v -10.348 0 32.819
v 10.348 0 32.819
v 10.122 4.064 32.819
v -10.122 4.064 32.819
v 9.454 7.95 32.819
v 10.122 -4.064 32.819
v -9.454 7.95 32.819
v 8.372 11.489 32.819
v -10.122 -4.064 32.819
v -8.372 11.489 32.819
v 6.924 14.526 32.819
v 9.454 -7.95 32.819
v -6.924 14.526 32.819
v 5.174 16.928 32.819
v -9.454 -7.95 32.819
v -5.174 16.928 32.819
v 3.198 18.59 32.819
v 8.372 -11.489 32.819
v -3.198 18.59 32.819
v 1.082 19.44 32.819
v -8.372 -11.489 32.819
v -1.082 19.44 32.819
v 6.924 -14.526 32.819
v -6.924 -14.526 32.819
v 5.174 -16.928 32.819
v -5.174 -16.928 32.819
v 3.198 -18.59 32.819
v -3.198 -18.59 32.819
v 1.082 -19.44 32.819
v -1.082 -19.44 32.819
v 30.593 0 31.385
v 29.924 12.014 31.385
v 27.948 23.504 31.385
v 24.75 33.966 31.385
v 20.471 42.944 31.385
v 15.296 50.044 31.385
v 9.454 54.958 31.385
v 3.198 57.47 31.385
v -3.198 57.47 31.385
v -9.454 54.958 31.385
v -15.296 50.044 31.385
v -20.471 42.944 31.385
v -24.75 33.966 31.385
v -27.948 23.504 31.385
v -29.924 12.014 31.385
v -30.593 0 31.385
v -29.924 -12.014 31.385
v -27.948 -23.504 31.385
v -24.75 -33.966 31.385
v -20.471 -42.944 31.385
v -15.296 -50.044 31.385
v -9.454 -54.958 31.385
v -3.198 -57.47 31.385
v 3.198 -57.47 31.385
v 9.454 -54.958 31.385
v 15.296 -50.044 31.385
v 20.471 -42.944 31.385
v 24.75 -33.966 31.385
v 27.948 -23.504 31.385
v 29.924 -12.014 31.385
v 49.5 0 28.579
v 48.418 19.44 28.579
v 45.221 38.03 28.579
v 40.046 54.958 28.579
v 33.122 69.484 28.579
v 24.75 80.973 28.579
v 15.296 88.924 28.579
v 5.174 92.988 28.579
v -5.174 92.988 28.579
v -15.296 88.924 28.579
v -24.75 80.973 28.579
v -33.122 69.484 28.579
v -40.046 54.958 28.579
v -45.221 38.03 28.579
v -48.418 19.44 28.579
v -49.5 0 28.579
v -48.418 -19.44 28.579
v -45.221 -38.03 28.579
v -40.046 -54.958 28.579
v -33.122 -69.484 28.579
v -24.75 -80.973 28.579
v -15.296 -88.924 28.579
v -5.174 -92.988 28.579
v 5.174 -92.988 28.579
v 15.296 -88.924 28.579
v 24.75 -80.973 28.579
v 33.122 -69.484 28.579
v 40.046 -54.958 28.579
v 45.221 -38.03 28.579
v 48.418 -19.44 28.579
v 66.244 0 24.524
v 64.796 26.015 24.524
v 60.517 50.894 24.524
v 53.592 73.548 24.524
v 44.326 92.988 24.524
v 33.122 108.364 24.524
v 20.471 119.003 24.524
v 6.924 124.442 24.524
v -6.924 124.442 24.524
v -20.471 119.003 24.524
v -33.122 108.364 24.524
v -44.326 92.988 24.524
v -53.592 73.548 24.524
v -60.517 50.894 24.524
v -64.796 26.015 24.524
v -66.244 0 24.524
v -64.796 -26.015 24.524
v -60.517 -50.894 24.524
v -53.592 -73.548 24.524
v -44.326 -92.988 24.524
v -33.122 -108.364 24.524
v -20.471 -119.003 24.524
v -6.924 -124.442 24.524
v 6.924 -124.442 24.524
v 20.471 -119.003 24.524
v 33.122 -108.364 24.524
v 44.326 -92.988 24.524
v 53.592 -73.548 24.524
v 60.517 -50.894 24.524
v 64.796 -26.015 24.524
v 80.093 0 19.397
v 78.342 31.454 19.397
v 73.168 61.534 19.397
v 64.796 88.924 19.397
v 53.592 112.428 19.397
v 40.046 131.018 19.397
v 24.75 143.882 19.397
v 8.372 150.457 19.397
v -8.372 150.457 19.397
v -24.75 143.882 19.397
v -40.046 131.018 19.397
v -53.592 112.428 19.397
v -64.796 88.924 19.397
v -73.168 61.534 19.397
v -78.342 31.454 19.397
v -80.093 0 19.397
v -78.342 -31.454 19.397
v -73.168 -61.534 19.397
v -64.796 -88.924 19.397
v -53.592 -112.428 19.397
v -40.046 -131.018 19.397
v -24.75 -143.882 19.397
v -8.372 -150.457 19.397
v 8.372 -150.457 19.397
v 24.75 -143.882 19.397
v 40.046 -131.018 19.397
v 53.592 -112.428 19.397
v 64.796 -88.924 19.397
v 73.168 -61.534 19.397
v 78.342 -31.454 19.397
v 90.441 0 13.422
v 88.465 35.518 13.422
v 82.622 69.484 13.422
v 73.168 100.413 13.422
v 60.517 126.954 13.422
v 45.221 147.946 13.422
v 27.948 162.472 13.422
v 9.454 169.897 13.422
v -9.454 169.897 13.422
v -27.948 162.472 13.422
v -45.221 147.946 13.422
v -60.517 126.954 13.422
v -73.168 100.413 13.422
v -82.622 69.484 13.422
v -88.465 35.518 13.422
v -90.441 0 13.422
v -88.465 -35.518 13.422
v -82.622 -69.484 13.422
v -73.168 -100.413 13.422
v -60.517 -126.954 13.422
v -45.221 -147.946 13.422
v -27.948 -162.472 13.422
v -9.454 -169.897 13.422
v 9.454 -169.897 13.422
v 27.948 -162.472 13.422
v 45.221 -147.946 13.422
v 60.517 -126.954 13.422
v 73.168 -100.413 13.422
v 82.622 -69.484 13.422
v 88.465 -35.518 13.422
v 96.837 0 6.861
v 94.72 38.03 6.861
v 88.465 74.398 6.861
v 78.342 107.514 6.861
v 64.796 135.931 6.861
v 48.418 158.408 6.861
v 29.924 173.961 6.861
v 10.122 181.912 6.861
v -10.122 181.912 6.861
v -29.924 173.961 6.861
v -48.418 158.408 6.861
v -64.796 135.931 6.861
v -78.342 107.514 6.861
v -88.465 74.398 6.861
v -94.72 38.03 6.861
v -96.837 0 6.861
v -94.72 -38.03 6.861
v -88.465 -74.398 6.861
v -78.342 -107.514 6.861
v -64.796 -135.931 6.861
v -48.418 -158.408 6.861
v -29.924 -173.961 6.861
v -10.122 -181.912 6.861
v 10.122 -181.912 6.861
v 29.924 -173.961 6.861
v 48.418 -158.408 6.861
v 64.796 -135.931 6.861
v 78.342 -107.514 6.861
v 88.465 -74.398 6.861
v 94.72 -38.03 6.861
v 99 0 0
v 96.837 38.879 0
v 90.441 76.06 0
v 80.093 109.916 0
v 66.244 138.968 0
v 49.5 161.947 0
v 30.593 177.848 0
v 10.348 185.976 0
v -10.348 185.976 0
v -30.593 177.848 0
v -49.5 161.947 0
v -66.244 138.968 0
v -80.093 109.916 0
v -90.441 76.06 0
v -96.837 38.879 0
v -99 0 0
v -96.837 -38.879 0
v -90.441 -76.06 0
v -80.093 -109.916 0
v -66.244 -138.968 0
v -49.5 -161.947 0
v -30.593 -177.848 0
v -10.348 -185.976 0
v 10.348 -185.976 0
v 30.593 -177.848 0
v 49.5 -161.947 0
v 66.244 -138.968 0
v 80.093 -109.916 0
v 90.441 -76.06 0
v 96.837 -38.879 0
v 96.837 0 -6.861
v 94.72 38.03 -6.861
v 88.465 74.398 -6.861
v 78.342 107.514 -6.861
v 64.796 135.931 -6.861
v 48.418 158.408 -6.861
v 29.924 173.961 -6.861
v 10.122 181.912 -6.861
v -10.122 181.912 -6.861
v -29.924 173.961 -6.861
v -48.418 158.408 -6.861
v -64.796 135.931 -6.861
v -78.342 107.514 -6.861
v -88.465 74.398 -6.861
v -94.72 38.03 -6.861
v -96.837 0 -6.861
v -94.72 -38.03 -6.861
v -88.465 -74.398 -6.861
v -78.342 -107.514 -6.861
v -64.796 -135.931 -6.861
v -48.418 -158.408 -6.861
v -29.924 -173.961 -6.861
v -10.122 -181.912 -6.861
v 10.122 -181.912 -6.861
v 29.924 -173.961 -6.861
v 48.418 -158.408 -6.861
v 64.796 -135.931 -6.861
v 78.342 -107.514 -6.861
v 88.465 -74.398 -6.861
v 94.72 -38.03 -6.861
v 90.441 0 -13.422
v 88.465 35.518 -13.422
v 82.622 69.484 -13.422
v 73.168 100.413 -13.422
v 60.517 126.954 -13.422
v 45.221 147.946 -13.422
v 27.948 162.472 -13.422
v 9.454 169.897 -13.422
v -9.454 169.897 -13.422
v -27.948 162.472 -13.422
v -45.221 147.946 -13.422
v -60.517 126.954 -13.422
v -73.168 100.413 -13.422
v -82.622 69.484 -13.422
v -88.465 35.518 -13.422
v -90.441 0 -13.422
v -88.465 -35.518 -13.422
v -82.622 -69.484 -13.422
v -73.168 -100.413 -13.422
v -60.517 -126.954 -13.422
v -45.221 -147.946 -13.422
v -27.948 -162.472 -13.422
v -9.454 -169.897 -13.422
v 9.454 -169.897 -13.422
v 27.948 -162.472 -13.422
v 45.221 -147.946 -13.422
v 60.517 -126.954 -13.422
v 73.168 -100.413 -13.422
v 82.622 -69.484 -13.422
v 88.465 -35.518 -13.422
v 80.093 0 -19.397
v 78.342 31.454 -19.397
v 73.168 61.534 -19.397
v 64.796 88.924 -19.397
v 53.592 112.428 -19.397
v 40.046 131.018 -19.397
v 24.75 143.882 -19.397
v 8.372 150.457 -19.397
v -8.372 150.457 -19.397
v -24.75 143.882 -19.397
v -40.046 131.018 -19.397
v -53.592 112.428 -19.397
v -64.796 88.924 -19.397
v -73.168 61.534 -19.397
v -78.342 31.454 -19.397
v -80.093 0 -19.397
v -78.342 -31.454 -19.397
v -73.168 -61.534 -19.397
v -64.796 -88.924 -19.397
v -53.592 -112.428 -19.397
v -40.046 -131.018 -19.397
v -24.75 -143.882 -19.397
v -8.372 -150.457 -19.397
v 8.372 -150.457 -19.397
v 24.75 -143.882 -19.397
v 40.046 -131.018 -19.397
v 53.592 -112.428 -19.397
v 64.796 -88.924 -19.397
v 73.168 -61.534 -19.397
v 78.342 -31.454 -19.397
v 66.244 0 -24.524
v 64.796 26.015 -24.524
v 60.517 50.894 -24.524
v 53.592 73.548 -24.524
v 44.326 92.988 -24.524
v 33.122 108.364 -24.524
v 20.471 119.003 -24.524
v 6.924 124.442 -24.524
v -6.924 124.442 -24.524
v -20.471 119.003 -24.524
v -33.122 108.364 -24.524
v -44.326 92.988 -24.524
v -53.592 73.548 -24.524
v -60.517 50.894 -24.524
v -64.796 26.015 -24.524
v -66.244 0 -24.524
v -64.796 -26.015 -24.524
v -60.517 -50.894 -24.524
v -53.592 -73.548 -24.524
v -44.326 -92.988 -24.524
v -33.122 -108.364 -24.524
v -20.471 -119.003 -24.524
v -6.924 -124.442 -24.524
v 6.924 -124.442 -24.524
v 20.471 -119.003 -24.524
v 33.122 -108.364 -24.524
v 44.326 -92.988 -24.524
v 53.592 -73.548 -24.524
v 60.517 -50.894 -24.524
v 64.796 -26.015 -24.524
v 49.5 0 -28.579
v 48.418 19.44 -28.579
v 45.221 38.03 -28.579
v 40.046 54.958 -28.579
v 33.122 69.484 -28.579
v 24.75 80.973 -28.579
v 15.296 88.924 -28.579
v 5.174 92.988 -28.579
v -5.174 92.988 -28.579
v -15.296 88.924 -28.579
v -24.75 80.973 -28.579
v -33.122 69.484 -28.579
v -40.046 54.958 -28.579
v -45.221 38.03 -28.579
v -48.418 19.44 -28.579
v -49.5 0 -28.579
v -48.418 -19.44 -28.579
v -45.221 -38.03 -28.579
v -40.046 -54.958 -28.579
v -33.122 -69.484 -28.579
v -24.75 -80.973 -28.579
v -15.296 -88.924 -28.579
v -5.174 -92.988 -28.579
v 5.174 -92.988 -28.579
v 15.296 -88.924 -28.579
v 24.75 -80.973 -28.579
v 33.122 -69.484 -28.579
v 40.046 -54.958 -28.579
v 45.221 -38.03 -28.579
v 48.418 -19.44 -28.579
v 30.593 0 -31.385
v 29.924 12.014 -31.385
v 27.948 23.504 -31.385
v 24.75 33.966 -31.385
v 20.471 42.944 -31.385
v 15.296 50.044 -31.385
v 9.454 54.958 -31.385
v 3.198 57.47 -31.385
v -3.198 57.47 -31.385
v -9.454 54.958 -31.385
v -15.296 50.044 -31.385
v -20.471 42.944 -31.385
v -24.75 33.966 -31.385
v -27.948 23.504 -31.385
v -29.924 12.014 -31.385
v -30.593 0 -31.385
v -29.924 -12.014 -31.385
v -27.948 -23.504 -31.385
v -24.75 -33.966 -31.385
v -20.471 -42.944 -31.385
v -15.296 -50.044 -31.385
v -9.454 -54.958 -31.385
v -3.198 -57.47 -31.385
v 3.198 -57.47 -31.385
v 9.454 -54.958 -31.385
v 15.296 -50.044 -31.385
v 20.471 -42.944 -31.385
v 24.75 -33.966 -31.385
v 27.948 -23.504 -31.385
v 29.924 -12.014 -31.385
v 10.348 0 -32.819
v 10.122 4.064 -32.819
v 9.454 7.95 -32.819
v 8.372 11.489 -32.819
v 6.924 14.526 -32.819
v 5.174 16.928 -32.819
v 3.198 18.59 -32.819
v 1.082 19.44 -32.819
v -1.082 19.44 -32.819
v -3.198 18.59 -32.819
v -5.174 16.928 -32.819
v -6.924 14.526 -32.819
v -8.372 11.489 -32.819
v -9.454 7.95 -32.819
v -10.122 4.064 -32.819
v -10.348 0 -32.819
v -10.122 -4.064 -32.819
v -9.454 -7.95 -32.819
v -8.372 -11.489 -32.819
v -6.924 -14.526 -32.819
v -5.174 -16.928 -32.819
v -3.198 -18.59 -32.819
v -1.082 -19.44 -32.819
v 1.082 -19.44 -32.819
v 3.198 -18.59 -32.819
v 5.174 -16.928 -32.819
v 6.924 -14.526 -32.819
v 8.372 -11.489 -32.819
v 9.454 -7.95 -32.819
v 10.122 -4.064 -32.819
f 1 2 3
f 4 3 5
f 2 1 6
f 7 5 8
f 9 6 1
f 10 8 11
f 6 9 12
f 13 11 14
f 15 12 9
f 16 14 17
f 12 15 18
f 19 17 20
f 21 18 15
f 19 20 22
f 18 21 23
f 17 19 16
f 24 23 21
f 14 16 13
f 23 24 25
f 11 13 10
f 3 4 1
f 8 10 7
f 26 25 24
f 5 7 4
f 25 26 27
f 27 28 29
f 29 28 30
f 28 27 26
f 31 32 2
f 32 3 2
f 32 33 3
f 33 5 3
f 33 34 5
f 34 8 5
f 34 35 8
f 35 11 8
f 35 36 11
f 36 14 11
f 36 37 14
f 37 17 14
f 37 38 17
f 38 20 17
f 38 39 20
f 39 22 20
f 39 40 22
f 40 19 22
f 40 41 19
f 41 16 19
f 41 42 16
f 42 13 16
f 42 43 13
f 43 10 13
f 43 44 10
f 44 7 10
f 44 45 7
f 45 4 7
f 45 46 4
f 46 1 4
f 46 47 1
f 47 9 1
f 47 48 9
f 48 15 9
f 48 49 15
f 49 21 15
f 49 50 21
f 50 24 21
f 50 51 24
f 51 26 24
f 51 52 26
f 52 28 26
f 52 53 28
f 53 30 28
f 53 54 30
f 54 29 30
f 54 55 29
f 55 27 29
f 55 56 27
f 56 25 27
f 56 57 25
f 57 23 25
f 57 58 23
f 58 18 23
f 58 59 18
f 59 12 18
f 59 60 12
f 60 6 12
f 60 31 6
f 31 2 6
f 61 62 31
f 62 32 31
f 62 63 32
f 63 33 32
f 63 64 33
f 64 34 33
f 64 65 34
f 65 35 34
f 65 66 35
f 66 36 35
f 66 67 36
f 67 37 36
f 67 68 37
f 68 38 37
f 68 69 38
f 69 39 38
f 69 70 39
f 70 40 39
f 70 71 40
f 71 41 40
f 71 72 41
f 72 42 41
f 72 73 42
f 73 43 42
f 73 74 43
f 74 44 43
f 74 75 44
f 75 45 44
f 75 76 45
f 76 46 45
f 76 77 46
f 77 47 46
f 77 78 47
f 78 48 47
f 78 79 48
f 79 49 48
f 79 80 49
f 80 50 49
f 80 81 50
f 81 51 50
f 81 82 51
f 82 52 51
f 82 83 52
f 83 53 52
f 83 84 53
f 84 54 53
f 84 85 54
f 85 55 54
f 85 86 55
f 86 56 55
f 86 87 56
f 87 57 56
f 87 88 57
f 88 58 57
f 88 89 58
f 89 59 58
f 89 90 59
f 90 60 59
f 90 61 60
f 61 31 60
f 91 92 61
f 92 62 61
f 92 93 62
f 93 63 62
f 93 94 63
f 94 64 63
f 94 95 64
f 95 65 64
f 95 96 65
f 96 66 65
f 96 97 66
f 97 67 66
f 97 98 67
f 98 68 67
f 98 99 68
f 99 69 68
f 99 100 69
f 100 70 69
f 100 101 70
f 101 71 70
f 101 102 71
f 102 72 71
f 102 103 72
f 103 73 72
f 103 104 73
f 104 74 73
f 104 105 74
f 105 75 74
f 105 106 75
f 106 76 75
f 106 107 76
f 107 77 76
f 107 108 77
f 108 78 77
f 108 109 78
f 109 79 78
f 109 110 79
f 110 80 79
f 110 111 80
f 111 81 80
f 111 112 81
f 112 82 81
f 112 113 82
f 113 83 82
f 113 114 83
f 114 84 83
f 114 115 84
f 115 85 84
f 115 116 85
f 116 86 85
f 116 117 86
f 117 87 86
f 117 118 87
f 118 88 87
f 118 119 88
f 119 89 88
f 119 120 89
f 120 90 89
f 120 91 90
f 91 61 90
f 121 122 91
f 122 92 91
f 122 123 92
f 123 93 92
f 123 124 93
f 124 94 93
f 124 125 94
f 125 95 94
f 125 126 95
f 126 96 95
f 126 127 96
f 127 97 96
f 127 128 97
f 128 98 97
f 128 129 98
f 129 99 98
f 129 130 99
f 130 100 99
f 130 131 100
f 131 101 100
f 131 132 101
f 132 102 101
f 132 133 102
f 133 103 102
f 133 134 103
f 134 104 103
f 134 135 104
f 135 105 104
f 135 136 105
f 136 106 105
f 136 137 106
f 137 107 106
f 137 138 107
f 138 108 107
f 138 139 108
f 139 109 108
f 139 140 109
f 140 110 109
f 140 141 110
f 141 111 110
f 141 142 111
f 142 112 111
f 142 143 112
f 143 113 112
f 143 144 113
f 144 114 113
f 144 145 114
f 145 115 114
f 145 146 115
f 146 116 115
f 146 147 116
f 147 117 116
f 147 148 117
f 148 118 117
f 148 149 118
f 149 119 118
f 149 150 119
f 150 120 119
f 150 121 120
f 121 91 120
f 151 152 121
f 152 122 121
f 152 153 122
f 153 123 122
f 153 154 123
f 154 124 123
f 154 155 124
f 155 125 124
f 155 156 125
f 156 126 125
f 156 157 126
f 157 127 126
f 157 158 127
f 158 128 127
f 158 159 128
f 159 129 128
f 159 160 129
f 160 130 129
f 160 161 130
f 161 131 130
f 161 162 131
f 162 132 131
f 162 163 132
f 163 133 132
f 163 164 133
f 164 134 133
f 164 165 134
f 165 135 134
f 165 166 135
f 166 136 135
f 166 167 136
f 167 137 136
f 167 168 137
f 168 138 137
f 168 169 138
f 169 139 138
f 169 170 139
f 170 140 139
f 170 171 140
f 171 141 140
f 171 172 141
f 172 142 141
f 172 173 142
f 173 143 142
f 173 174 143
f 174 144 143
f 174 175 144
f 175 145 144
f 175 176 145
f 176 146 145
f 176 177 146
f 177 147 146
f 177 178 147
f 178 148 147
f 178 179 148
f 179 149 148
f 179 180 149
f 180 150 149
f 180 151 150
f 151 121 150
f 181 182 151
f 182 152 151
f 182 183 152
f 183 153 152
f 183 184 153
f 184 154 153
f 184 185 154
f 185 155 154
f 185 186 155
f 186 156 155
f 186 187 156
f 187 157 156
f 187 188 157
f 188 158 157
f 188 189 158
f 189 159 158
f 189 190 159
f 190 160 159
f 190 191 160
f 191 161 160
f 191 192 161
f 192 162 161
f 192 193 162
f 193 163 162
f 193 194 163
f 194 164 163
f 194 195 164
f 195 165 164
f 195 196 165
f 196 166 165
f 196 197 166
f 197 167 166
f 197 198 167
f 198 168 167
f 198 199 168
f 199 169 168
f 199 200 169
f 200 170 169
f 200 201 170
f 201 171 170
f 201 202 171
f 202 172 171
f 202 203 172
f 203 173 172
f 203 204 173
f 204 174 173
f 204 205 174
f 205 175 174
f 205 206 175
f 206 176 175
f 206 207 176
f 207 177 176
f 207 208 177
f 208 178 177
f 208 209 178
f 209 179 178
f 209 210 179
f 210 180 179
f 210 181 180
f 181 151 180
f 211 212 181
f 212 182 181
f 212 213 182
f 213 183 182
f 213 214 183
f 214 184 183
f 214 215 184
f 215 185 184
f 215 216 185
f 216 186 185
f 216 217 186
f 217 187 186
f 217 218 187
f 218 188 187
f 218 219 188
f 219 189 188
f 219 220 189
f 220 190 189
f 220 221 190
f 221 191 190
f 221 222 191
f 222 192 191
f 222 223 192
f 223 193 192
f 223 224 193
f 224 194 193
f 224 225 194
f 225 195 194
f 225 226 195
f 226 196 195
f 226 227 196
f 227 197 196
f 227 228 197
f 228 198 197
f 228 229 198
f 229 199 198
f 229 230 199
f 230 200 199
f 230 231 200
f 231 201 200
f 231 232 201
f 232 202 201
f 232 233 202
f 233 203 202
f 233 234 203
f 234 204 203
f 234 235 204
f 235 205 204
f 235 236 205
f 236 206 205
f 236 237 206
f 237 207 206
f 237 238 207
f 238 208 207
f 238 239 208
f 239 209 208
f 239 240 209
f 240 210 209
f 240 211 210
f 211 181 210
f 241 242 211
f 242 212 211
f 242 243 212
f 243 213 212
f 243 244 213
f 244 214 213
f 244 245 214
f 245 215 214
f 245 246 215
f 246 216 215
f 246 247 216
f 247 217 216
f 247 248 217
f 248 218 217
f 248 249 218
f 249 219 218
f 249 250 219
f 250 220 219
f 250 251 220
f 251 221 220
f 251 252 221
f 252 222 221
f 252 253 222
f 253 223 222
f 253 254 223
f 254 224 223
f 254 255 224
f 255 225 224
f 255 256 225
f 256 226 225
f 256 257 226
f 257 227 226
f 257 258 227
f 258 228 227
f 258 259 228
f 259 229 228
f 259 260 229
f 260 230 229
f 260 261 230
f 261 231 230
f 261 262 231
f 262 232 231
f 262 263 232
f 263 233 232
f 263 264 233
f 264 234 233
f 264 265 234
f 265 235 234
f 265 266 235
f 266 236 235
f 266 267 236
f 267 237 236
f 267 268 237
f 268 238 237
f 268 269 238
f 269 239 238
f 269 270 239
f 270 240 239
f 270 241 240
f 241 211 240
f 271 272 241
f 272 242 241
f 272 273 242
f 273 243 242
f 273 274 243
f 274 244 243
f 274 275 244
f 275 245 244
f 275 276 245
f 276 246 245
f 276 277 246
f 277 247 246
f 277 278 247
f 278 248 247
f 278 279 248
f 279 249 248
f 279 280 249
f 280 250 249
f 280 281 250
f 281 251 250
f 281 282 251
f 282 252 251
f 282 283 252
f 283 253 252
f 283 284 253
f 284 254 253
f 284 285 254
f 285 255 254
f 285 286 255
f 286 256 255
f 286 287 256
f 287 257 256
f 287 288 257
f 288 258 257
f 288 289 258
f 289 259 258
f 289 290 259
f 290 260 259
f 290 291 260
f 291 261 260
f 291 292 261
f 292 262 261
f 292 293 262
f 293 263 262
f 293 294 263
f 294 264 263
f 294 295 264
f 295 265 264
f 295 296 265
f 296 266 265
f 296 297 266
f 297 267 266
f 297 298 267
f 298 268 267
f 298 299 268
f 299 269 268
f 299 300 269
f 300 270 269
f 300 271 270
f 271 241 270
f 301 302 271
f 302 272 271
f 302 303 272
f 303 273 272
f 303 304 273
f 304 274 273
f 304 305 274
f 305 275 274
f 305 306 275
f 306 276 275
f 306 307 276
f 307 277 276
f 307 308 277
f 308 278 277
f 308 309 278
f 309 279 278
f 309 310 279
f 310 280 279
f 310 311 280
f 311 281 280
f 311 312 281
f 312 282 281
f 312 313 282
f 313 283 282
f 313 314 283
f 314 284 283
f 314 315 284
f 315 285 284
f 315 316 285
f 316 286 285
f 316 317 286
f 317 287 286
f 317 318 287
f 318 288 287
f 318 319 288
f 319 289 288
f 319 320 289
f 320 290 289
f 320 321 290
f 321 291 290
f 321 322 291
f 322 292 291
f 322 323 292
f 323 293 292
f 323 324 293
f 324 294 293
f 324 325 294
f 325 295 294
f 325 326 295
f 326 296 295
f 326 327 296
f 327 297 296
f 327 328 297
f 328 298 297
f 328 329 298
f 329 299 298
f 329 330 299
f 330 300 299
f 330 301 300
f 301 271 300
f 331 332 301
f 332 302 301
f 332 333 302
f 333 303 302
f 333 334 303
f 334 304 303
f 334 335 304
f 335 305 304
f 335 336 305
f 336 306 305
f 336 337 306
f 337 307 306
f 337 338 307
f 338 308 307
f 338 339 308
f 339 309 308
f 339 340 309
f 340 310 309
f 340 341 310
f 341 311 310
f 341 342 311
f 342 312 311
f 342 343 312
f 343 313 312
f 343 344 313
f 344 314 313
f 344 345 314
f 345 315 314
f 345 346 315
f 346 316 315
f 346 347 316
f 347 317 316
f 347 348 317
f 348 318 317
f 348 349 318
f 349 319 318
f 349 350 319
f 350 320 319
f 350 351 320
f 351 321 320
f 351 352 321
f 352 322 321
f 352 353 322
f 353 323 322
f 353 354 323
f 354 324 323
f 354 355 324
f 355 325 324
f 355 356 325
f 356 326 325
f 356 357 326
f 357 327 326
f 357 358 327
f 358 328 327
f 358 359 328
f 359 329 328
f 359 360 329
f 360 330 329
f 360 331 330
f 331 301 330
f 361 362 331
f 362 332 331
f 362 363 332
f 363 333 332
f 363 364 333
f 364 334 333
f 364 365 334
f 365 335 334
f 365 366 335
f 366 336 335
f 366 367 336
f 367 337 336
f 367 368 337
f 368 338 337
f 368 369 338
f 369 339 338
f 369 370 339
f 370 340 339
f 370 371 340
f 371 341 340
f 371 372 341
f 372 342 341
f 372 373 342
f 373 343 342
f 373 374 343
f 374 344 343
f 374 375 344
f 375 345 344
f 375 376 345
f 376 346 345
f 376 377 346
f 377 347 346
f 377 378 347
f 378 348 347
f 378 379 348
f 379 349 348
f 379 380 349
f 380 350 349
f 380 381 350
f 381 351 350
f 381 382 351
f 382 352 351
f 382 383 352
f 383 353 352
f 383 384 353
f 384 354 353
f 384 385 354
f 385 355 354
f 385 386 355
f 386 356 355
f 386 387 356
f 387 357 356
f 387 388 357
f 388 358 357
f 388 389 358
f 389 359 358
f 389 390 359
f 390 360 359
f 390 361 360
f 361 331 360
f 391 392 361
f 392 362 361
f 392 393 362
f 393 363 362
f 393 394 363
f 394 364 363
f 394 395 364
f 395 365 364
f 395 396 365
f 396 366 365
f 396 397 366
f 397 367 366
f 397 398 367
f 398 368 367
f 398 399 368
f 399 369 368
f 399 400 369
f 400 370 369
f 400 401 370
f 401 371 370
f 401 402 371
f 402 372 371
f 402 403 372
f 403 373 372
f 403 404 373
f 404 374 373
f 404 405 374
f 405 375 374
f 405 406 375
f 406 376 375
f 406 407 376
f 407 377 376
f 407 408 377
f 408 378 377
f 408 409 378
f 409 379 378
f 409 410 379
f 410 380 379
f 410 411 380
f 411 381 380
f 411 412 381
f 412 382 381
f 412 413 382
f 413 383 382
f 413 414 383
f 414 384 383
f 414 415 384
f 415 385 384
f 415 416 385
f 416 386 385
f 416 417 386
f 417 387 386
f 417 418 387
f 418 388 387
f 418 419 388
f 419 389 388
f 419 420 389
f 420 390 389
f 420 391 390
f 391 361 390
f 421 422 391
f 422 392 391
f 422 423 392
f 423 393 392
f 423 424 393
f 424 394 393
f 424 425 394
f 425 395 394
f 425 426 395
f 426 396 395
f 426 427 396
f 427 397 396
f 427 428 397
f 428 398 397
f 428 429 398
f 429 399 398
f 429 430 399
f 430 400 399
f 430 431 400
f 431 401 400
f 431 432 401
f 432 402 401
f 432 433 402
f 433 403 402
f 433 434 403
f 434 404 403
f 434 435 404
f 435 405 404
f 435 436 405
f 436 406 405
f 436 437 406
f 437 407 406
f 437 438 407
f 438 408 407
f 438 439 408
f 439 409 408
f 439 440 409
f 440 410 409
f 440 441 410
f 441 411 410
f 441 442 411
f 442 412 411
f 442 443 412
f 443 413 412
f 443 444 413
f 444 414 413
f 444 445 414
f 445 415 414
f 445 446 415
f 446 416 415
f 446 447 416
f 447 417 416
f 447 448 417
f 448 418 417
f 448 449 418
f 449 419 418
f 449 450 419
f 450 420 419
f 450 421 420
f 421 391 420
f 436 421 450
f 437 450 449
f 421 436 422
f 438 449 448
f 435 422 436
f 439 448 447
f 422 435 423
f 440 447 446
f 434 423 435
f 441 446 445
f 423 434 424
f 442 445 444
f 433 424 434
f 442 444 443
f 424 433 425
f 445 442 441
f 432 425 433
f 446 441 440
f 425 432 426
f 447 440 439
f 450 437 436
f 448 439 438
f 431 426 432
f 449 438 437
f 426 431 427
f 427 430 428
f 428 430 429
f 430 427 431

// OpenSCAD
// Generated by SolidPython 1.0.1 on 2020-07-29 00:46:49


scale(v = [9, 17, 3]) {
	sphere(r = 11);
}
/***********************************************
*********      SolidPython code:      **********
************************************************
 
# import packages: SolidPython
from solid import *
from solid.utils import *
from itertools import chain, combinations, permutations


class Resize:

    def __init__(self, scad_file):
        self.scad_file = scad_file
        #self.scad_file = import_scad(scad_file)
        # cone/cylinder param:
        self.r1 = 0
        self.r2 = 0
        self.h = 0
        # rectangular prism param:
        self.w = 0
        self.l = 0
        # ellipse param:
        self.r = 0

    # import OpenScad code (file name corresponds to shape)


    # classify shape + parameters
    def assign(self, param1, param2, param3):
        if self.scad_file == 'cone.scad':
            self.r1 = param1
            self.r2 = param2
            self.h = param3
        elif self.scad_file == 'cylinder.scad':
            self.r1 = param1
            self.r2 = param2
            self.h = param3
        elif self.scad_file == 'rectangularPrism.scad':
            self.h = param1
            self.l = param2
            self.w = param3
        else:
            self.r = param1
            self.h = param2

    # resize parameters
    def iterate(self):
        x = range(3, 20, 2)
        i = 1
        if self.scad_file == 'cone.scad':
            tempList = list(permutations(x, 2))
            for temp in tempList:
                param1 = temp[0]
                param2 = temp[1]
                filepath = 'produced_scad_files/' + 'cone' + str(param1) + '_' + str(param2) + '_' + '.scad'
                scad_render_to_file(cylinder(h=param1, r1=param2, r2=0), filepath)

        elif self.scad_file == 'cylinder.scad':
            tempList = list(permutations(x, 3))
            for temp in tempList:
                param1 = temp[0]
                param2 = temp[1]
                filepath = 'produced_scad_files/' + 'cylinder' + str(param1) + '_' + str(param2) + '_' + '.scad'
                scad_render_to_file(cylinder(h=param1, r1=param2, r2=param2), filepath)

        elif self.scad_file == 'rectangularPrism.scad':
            tempList = list(permutations(x, 3))
            for temp in tempList:
                param1 = temp[0]
                param2 = temp[1]
                param3 = temp[2]
                filepath = 'produced_scad_files/' + 'rectangularPrism' + str(param1) + '_' + str(param2) + '_' + str(
                    param3) + '.scad'
                scad_render_to_file(cube(size=(param1, param2, param3)), filepath)

        elif self.scad_file == 'ellipse.scad':
            tempList = list(permutations(x, 4))
            for temp in tempList:
                param1 = temp[0]
                param2 = temp[1]
                param3 = temp[2]
                param4 = temp[3]
                filepath = 'produced_scad_files/' + 'ellipse' + str(param1) + '_' + str(param2) + '_' + str(param3) + '_' + str(param4) + '.scad'
                scad_render_to_file(scale([param1, param2, param3])(sphere(r=param4)), filepath)

    def render_to_scadfile(self):
        scad_render_to_file(scad, 'example.scad') 
 
************************************************/
